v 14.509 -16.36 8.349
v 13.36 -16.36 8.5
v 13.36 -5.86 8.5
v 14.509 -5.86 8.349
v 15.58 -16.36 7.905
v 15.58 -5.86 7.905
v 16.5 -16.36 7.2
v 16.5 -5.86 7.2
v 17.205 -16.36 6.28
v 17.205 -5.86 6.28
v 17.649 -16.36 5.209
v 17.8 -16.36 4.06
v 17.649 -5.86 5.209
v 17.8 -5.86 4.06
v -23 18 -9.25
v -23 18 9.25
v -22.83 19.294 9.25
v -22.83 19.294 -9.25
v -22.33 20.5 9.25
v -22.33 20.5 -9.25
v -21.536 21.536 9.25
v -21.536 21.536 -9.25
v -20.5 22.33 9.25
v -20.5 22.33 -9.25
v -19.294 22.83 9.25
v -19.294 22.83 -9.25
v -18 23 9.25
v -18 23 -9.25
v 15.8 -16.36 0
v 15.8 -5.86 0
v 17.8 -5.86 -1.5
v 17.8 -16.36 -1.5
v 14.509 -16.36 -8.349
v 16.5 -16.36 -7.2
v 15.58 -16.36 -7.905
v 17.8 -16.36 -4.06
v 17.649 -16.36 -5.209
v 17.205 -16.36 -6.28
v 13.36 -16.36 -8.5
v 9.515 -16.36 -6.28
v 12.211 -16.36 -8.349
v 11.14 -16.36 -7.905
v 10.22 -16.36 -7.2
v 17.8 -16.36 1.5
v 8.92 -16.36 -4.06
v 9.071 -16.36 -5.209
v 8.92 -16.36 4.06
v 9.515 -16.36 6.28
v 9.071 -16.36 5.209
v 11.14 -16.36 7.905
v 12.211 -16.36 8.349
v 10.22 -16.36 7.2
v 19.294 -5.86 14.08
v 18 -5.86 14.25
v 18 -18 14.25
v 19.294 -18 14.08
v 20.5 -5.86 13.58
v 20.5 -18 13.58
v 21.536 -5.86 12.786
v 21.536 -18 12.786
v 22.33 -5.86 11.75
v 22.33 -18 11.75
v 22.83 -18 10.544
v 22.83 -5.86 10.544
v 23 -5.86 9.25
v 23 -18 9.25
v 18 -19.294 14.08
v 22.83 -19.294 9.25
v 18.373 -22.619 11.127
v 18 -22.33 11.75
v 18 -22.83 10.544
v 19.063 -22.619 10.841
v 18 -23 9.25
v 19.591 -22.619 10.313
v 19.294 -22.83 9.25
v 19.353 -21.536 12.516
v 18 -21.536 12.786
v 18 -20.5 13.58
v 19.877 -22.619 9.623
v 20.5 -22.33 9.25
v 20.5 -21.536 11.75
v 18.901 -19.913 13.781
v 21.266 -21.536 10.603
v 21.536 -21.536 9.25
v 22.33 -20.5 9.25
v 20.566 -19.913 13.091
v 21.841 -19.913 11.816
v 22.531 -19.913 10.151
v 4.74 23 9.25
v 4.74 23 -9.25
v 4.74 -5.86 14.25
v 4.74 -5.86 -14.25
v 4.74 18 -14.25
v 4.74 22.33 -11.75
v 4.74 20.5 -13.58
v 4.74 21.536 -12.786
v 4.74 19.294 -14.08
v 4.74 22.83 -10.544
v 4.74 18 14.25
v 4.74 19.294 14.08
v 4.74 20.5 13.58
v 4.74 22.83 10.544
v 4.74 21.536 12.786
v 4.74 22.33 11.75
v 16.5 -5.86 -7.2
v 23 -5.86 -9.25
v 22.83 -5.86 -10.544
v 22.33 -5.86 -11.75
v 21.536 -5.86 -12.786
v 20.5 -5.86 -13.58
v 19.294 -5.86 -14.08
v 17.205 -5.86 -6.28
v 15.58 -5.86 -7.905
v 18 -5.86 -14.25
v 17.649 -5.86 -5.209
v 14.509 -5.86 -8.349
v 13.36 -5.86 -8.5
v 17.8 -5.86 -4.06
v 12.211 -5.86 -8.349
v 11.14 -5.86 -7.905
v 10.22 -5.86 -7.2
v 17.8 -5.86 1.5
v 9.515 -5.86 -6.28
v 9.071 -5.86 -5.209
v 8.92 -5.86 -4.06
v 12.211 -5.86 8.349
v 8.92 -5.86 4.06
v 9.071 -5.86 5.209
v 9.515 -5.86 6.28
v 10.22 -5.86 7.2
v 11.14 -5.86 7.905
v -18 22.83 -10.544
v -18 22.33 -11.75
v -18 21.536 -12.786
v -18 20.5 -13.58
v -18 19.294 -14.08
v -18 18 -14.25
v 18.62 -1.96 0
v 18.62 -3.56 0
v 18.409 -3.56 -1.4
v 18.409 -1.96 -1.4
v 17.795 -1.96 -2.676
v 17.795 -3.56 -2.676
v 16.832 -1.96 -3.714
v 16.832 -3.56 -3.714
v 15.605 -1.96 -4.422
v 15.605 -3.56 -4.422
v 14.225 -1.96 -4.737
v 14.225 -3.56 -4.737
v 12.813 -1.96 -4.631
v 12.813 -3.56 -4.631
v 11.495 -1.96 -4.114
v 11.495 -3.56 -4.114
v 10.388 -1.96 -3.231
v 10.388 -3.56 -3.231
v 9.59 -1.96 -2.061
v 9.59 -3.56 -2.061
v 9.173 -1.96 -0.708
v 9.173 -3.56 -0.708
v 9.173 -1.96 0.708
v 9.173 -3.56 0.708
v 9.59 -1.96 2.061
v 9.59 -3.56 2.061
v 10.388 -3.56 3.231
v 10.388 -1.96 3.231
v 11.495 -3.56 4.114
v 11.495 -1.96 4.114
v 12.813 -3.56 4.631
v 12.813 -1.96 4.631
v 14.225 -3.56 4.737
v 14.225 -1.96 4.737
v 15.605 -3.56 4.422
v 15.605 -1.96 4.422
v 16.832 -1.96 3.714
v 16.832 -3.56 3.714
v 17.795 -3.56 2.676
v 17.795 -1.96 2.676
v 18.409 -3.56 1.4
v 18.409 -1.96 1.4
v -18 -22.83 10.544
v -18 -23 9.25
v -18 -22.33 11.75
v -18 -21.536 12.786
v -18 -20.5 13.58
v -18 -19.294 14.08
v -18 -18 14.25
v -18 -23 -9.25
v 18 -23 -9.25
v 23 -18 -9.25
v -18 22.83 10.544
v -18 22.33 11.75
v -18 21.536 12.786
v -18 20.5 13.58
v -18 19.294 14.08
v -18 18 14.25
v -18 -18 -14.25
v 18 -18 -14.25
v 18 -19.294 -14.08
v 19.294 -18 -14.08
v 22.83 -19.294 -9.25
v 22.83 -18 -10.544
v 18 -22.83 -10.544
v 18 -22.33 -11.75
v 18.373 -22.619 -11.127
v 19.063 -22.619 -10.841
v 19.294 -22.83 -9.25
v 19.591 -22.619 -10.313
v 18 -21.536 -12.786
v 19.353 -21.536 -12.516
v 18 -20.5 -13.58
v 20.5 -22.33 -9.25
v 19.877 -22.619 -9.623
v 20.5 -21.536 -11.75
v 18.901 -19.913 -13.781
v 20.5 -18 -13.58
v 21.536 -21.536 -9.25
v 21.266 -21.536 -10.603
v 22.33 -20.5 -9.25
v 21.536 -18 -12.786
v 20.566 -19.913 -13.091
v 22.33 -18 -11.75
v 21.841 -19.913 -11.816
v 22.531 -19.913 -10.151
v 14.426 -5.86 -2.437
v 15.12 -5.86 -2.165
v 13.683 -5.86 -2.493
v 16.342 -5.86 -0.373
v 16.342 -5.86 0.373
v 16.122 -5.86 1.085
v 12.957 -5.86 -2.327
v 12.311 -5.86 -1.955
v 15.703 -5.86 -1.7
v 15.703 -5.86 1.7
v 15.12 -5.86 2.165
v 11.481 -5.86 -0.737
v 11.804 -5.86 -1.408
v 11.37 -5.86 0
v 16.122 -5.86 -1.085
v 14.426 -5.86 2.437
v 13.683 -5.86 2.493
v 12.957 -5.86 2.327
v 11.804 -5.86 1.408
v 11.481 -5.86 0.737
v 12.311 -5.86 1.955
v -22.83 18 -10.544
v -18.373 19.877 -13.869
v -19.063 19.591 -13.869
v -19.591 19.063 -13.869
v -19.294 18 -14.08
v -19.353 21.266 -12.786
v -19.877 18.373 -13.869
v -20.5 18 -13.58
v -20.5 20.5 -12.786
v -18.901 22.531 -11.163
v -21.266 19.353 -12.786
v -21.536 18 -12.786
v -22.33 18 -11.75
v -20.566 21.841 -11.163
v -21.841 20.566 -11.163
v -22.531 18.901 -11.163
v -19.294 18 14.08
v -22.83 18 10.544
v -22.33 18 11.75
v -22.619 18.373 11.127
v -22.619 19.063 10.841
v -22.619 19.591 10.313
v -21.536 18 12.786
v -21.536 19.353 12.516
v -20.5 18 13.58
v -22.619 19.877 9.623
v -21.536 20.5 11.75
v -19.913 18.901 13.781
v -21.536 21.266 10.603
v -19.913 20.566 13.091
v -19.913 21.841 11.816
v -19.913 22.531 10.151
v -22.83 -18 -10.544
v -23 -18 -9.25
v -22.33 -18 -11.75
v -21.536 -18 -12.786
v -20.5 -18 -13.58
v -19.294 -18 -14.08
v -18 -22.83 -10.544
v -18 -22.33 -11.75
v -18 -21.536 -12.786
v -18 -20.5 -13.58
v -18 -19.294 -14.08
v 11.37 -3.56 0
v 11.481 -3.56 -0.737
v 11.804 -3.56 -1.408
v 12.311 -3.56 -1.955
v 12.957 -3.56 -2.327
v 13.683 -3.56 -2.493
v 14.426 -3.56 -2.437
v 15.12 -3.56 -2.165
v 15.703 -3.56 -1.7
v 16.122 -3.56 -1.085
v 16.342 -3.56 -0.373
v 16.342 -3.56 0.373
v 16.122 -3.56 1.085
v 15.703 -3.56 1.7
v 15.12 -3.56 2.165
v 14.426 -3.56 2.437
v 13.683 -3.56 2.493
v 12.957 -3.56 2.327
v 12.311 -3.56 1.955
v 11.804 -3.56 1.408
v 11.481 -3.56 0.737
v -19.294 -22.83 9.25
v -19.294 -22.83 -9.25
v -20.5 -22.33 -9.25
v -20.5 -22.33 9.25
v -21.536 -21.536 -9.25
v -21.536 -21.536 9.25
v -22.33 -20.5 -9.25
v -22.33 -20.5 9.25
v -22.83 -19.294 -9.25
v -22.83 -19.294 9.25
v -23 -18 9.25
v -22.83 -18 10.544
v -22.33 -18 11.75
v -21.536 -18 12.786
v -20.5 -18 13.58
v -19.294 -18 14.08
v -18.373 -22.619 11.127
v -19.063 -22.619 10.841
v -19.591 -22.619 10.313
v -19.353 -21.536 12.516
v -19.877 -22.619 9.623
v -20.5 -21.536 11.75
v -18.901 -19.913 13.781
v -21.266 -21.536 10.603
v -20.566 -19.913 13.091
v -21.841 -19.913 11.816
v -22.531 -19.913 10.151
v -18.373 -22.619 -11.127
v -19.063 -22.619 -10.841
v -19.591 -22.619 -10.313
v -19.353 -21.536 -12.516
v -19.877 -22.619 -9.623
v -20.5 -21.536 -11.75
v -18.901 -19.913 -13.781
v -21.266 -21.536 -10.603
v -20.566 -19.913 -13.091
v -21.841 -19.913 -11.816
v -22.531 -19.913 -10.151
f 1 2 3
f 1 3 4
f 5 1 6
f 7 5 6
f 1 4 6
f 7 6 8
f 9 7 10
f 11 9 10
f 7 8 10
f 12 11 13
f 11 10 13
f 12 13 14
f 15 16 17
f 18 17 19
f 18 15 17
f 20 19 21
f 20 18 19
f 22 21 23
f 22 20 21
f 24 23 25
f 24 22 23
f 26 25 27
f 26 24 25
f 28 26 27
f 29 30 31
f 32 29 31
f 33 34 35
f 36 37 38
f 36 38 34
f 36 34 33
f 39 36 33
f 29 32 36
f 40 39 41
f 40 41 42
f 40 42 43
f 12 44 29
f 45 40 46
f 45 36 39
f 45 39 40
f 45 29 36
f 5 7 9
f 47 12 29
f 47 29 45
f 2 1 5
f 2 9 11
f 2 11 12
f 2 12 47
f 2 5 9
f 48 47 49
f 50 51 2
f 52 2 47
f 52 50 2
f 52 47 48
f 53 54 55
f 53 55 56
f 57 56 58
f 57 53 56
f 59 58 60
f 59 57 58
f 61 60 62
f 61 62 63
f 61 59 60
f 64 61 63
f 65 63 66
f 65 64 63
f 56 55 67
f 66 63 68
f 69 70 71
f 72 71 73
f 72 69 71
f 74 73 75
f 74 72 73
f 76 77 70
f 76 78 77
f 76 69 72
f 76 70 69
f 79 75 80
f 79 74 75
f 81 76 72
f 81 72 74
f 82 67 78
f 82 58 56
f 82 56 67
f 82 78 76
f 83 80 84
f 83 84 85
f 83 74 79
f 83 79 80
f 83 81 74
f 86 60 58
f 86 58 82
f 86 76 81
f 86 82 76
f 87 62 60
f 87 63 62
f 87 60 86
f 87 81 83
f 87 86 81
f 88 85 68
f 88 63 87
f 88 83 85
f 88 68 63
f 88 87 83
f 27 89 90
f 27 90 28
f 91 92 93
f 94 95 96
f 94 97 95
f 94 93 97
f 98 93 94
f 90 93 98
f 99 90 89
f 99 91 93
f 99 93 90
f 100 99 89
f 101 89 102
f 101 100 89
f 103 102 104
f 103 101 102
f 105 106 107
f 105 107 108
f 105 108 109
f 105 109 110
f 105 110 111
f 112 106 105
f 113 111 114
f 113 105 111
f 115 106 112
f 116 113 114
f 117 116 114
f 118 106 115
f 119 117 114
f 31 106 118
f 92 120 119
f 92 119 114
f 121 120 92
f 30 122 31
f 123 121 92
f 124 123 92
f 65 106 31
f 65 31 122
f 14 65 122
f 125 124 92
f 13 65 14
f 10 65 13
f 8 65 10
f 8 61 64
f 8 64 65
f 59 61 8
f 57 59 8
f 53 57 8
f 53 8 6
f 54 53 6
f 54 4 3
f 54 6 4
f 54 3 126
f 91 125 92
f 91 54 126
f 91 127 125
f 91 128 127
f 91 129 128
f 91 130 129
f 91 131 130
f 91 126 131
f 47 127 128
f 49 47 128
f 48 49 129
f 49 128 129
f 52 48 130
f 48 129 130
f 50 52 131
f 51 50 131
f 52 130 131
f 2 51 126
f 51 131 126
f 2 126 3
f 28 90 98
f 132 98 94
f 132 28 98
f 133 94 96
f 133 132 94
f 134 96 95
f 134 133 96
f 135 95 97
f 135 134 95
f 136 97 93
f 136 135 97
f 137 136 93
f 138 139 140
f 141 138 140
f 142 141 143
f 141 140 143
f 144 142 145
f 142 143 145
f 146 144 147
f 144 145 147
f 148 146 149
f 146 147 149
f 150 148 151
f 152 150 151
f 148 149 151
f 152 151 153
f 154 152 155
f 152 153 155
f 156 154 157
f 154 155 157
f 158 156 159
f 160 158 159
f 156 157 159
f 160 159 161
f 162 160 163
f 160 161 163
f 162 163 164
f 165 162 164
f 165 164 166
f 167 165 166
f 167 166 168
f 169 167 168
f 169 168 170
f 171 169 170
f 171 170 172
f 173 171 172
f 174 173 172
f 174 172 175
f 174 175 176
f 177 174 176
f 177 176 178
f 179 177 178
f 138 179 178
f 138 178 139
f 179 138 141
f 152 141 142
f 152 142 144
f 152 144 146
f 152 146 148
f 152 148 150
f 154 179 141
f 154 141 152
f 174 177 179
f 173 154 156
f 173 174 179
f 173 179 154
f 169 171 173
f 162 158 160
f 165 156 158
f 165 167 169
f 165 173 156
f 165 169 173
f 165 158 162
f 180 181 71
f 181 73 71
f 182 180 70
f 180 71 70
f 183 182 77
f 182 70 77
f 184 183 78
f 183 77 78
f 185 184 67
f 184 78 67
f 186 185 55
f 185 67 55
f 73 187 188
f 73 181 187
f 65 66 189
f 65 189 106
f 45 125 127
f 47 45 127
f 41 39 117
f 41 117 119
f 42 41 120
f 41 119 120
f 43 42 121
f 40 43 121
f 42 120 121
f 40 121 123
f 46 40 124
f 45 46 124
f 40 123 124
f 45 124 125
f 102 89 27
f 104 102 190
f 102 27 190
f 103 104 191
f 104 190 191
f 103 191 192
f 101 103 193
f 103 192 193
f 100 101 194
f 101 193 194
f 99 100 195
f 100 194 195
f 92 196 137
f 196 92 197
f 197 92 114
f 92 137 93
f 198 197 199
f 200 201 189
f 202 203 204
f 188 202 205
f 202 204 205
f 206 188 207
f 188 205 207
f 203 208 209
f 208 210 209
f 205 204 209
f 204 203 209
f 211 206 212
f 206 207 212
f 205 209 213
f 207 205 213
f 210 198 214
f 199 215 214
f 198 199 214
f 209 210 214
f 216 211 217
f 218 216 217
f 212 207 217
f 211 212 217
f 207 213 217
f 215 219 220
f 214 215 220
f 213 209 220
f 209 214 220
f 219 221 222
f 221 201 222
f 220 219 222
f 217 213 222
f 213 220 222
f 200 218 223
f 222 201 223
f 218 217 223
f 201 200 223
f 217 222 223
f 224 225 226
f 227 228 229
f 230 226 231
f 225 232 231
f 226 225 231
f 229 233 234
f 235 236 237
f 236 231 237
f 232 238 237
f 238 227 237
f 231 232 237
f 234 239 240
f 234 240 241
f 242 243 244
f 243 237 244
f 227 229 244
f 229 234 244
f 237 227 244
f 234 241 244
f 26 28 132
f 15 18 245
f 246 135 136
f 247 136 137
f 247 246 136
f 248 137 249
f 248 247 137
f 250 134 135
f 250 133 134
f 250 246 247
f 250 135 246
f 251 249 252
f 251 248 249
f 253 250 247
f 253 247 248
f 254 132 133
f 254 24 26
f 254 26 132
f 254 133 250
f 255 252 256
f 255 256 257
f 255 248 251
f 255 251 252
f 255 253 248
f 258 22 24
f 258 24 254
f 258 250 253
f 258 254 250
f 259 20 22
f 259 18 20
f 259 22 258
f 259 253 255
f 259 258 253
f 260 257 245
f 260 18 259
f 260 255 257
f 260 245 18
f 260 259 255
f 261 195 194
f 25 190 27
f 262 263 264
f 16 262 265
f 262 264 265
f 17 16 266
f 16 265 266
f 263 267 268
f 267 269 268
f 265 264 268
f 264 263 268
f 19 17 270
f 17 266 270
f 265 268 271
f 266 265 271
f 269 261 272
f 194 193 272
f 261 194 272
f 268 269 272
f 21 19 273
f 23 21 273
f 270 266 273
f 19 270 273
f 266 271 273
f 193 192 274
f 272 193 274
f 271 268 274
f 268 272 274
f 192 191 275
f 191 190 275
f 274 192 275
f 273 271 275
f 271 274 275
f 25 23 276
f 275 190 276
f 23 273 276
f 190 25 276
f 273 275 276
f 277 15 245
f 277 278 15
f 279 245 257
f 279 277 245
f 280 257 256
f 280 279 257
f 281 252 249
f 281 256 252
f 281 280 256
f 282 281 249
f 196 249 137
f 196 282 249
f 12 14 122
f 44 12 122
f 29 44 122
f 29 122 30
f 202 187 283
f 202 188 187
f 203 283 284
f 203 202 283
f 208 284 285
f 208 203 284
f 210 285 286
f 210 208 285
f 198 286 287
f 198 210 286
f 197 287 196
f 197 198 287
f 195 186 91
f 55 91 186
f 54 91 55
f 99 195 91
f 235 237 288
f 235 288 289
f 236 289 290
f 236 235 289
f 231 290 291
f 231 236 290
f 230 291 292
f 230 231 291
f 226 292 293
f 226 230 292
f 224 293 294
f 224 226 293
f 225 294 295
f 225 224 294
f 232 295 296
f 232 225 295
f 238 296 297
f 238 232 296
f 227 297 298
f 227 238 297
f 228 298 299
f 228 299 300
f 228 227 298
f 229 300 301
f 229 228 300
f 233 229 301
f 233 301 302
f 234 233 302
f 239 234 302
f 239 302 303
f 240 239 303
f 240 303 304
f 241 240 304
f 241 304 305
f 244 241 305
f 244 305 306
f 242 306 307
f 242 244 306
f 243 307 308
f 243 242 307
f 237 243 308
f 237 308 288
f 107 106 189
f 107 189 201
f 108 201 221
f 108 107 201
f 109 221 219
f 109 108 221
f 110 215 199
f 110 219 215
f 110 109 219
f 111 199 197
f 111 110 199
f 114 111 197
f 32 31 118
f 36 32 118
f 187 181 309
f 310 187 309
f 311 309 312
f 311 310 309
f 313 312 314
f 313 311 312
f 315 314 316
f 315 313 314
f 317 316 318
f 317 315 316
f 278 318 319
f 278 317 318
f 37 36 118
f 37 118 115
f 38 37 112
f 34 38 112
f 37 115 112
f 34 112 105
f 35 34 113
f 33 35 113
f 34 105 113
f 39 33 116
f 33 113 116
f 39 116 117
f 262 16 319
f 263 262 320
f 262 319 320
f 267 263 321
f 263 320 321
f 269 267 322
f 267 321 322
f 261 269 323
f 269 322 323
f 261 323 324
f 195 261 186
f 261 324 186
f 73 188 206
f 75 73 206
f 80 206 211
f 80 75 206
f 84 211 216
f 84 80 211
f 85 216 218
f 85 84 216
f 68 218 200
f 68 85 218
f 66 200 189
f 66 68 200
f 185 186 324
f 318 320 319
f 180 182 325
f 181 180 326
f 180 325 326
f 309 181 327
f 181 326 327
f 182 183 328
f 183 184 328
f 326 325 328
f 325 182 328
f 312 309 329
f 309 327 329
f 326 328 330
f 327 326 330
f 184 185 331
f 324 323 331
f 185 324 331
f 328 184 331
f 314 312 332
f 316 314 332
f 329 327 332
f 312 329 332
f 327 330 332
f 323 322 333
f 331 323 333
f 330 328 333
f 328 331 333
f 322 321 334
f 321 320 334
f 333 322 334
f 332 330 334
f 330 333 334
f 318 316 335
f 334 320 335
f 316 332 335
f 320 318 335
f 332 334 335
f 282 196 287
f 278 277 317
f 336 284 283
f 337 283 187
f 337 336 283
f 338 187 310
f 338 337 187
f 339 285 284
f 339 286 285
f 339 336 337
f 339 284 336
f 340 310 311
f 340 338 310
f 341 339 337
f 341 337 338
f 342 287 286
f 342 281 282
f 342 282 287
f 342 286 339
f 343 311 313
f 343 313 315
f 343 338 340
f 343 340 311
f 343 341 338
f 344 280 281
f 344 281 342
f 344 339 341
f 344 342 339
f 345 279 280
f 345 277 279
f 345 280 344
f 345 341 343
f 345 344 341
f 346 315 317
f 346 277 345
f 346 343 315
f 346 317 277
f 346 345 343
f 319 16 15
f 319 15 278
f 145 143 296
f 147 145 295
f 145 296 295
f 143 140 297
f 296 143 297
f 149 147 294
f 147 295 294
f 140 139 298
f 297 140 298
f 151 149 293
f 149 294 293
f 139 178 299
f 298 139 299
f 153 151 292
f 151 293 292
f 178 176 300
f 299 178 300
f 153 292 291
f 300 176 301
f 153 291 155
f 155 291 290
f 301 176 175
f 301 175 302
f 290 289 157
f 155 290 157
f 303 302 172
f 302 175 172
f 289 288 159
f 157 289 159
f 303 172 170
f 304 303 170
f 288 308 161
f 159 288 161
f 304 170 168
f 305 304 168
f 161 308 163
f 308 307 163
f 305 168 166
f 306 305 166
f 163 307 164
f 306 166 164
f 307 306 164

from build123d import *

# Parameters (mm, degrees)
F1_DEPTH = 14.25
F2_R     = 5
F4_DEPTH = 3.9
F5_DEPTH = 2.3
F8_DEPTH = 10.5


with BuildPart() as f1:
    # F0 (on Top) → F1 (new body, symmetric)
    with BuildSketch(Plane.XY):
        Polygon((-23, -23), (23, -23), (23, -5.86), (4.74, -5.86), (4.74, 23), (-23, 23), align=None)
    extrude(amount=F1_DEPTH, both=True)

    # F2
    f2_edges = [f1.edges().sort_by_distance(p)[0] for p in [
        (23, -14.43, 14.25),
        (23, -14.43, -14.25),
        (-9.13, 23, 14.25),
        (-23, 0, 14.25),
        (-23, 23, 0),
        (-9.13, 23, -14.25),
        (-23, 0, -14.25),
        (0, -23, -14.25),
        (0, -23, 14.25),
        (-23, -23, 0),
        (23, -23, 0),
    ]]
    fillet(f2_edges, radius=F2_R)

    # F7 (on face) → F8 (cut)
    with BuildSketch(Plane(origin=(0, -5.86, 0), x_dir=(-1, 0, 0), z_dir=(0, 1, 0))):
        with BuildLine():
            Line((-8.92, -4.06), (-8.92, 0))
            Line((-8.92, 0), (-9.12, 0))
            ThreePointArc((-9.12, 0), (-12.4744714263, 4.5403744339), (-17.8, 2.6678830559))
            Line((-17.8, 2.6678830559), (-17.8, 1.5))
            Line((-17.8, 1.5), (-15.8, 0))
            Line((-15.8, 0), (-17.8, -1.5))
            Line((-17.8, -1.5), (-17.8, -4.06))
            ThreePointArc((-17.8, -4.06), (-16.4995541085, -7.1995541085), (-13.36, -8.5))
            ThreePointArc((-13.36, -8.5), (-10.2204458915, -7.1995541085), (-8.92, -4.06))
        make_face()
        with BuildLine():
            Line((-8.92, 0), (-8.92, 4.06))
            ThreePointArc((-8.92, 4.06), (-10.2204458915, 7.1995541085), (-13.36, 8.5))
            ThreePointArc((-13.36, 8.5), (-16.4995541085, 7.1995541085), (-17.8, 4.06))
            Line((-17.8, 4.06), (-17.8, 2.6678830559))
            ThreePointArc((-17.8, 2.6678830559), (-12.4744714263, 4.5403744339), (-9.12, 0))
            Line((-9.12, 0), (-8.92, 0))
        make_face()
    extrude(amount=-F8_DEPTH, mode=Mode.SUBTRACT)


with BuildPart() as f4:
    # F3 (on face) → F4 (new body)
    with BuildSketch(Plane(origin=(0, -5.86, 0), x_dir=(-1, 0, 0), z_dir=(0, 1, 0))):
        with BuildLine():
            ThreePointArc((-16.37, 0), (-13.87, 2.5), (-11.37, 0))
            Line((-11.37, 0), (-9.12, 0))
            ThreePointArc((-9.12, 0), (-13.87, 4.75), (-18.62, 0))
            Line((-18.62, 0), (-16.37, 0))
        make_face()
        with BuildLine():
            Line((-16.37, 0), (-11.37, 0))
            ThreePointArc((-11.37, 0), (-13.87, 2.5), (-16.37, 0))
        make_face()
        with BuildLine():
            ThreePointArc((-16.37, 0), (-13.87, -2.5), (-11.37, 0))
            Line((-11.37, 0), (-16.37, 0))
        make_face()
        with BuildLine():
            Line((-9.12, 0), (-11.37, 0))
            ThreePointArc((-11.37, 0), (-13.87, -2.5), (-16.37, 0))
            Line((-16.37, 0), (-18.62, 0))
            ThreePointArc((-18.62, 0), (-13.87, -4.75), (-9.12, 0))
        make_face()
    extrude(amount=F4_DEPTH)

    # F3 (on face) → F5 (cut)
    with BuildSketch(Plane(origin=(0, -5.86, 0), x_dir=(-1, 0, 0), z_dir=(0, 1, 0))):
        with BuildLine():
            ThreePointArc((-16.37, 0), (-13.87, 2.5), (-11.37, 0))
            Line((-11.37, 0), (-9.12, 0))
            ThreePointArc((-9.12, 0), (-13.87, 4.75), (-18.62, 0))
            Line((-18.62, 0), (-16.37, 0))
        make_face()
        with BuildLine():
            Line((-9.12, 0), (-11.37, 0))
            ThreePointArc((-11.37, 0), (-13.87, -2.5), (-16.37, 0))
            Line((-16.37, 0), (-18.62, 0))
            ThreePointArc((-18.62, 0), (-13.87, -4.75), (-9.12, 0))
        make_face()
    extrude(amount=F5_DEPTH, mode=Mode.SUBTRACT)


solid = Compound([f1.part, f4.part])
